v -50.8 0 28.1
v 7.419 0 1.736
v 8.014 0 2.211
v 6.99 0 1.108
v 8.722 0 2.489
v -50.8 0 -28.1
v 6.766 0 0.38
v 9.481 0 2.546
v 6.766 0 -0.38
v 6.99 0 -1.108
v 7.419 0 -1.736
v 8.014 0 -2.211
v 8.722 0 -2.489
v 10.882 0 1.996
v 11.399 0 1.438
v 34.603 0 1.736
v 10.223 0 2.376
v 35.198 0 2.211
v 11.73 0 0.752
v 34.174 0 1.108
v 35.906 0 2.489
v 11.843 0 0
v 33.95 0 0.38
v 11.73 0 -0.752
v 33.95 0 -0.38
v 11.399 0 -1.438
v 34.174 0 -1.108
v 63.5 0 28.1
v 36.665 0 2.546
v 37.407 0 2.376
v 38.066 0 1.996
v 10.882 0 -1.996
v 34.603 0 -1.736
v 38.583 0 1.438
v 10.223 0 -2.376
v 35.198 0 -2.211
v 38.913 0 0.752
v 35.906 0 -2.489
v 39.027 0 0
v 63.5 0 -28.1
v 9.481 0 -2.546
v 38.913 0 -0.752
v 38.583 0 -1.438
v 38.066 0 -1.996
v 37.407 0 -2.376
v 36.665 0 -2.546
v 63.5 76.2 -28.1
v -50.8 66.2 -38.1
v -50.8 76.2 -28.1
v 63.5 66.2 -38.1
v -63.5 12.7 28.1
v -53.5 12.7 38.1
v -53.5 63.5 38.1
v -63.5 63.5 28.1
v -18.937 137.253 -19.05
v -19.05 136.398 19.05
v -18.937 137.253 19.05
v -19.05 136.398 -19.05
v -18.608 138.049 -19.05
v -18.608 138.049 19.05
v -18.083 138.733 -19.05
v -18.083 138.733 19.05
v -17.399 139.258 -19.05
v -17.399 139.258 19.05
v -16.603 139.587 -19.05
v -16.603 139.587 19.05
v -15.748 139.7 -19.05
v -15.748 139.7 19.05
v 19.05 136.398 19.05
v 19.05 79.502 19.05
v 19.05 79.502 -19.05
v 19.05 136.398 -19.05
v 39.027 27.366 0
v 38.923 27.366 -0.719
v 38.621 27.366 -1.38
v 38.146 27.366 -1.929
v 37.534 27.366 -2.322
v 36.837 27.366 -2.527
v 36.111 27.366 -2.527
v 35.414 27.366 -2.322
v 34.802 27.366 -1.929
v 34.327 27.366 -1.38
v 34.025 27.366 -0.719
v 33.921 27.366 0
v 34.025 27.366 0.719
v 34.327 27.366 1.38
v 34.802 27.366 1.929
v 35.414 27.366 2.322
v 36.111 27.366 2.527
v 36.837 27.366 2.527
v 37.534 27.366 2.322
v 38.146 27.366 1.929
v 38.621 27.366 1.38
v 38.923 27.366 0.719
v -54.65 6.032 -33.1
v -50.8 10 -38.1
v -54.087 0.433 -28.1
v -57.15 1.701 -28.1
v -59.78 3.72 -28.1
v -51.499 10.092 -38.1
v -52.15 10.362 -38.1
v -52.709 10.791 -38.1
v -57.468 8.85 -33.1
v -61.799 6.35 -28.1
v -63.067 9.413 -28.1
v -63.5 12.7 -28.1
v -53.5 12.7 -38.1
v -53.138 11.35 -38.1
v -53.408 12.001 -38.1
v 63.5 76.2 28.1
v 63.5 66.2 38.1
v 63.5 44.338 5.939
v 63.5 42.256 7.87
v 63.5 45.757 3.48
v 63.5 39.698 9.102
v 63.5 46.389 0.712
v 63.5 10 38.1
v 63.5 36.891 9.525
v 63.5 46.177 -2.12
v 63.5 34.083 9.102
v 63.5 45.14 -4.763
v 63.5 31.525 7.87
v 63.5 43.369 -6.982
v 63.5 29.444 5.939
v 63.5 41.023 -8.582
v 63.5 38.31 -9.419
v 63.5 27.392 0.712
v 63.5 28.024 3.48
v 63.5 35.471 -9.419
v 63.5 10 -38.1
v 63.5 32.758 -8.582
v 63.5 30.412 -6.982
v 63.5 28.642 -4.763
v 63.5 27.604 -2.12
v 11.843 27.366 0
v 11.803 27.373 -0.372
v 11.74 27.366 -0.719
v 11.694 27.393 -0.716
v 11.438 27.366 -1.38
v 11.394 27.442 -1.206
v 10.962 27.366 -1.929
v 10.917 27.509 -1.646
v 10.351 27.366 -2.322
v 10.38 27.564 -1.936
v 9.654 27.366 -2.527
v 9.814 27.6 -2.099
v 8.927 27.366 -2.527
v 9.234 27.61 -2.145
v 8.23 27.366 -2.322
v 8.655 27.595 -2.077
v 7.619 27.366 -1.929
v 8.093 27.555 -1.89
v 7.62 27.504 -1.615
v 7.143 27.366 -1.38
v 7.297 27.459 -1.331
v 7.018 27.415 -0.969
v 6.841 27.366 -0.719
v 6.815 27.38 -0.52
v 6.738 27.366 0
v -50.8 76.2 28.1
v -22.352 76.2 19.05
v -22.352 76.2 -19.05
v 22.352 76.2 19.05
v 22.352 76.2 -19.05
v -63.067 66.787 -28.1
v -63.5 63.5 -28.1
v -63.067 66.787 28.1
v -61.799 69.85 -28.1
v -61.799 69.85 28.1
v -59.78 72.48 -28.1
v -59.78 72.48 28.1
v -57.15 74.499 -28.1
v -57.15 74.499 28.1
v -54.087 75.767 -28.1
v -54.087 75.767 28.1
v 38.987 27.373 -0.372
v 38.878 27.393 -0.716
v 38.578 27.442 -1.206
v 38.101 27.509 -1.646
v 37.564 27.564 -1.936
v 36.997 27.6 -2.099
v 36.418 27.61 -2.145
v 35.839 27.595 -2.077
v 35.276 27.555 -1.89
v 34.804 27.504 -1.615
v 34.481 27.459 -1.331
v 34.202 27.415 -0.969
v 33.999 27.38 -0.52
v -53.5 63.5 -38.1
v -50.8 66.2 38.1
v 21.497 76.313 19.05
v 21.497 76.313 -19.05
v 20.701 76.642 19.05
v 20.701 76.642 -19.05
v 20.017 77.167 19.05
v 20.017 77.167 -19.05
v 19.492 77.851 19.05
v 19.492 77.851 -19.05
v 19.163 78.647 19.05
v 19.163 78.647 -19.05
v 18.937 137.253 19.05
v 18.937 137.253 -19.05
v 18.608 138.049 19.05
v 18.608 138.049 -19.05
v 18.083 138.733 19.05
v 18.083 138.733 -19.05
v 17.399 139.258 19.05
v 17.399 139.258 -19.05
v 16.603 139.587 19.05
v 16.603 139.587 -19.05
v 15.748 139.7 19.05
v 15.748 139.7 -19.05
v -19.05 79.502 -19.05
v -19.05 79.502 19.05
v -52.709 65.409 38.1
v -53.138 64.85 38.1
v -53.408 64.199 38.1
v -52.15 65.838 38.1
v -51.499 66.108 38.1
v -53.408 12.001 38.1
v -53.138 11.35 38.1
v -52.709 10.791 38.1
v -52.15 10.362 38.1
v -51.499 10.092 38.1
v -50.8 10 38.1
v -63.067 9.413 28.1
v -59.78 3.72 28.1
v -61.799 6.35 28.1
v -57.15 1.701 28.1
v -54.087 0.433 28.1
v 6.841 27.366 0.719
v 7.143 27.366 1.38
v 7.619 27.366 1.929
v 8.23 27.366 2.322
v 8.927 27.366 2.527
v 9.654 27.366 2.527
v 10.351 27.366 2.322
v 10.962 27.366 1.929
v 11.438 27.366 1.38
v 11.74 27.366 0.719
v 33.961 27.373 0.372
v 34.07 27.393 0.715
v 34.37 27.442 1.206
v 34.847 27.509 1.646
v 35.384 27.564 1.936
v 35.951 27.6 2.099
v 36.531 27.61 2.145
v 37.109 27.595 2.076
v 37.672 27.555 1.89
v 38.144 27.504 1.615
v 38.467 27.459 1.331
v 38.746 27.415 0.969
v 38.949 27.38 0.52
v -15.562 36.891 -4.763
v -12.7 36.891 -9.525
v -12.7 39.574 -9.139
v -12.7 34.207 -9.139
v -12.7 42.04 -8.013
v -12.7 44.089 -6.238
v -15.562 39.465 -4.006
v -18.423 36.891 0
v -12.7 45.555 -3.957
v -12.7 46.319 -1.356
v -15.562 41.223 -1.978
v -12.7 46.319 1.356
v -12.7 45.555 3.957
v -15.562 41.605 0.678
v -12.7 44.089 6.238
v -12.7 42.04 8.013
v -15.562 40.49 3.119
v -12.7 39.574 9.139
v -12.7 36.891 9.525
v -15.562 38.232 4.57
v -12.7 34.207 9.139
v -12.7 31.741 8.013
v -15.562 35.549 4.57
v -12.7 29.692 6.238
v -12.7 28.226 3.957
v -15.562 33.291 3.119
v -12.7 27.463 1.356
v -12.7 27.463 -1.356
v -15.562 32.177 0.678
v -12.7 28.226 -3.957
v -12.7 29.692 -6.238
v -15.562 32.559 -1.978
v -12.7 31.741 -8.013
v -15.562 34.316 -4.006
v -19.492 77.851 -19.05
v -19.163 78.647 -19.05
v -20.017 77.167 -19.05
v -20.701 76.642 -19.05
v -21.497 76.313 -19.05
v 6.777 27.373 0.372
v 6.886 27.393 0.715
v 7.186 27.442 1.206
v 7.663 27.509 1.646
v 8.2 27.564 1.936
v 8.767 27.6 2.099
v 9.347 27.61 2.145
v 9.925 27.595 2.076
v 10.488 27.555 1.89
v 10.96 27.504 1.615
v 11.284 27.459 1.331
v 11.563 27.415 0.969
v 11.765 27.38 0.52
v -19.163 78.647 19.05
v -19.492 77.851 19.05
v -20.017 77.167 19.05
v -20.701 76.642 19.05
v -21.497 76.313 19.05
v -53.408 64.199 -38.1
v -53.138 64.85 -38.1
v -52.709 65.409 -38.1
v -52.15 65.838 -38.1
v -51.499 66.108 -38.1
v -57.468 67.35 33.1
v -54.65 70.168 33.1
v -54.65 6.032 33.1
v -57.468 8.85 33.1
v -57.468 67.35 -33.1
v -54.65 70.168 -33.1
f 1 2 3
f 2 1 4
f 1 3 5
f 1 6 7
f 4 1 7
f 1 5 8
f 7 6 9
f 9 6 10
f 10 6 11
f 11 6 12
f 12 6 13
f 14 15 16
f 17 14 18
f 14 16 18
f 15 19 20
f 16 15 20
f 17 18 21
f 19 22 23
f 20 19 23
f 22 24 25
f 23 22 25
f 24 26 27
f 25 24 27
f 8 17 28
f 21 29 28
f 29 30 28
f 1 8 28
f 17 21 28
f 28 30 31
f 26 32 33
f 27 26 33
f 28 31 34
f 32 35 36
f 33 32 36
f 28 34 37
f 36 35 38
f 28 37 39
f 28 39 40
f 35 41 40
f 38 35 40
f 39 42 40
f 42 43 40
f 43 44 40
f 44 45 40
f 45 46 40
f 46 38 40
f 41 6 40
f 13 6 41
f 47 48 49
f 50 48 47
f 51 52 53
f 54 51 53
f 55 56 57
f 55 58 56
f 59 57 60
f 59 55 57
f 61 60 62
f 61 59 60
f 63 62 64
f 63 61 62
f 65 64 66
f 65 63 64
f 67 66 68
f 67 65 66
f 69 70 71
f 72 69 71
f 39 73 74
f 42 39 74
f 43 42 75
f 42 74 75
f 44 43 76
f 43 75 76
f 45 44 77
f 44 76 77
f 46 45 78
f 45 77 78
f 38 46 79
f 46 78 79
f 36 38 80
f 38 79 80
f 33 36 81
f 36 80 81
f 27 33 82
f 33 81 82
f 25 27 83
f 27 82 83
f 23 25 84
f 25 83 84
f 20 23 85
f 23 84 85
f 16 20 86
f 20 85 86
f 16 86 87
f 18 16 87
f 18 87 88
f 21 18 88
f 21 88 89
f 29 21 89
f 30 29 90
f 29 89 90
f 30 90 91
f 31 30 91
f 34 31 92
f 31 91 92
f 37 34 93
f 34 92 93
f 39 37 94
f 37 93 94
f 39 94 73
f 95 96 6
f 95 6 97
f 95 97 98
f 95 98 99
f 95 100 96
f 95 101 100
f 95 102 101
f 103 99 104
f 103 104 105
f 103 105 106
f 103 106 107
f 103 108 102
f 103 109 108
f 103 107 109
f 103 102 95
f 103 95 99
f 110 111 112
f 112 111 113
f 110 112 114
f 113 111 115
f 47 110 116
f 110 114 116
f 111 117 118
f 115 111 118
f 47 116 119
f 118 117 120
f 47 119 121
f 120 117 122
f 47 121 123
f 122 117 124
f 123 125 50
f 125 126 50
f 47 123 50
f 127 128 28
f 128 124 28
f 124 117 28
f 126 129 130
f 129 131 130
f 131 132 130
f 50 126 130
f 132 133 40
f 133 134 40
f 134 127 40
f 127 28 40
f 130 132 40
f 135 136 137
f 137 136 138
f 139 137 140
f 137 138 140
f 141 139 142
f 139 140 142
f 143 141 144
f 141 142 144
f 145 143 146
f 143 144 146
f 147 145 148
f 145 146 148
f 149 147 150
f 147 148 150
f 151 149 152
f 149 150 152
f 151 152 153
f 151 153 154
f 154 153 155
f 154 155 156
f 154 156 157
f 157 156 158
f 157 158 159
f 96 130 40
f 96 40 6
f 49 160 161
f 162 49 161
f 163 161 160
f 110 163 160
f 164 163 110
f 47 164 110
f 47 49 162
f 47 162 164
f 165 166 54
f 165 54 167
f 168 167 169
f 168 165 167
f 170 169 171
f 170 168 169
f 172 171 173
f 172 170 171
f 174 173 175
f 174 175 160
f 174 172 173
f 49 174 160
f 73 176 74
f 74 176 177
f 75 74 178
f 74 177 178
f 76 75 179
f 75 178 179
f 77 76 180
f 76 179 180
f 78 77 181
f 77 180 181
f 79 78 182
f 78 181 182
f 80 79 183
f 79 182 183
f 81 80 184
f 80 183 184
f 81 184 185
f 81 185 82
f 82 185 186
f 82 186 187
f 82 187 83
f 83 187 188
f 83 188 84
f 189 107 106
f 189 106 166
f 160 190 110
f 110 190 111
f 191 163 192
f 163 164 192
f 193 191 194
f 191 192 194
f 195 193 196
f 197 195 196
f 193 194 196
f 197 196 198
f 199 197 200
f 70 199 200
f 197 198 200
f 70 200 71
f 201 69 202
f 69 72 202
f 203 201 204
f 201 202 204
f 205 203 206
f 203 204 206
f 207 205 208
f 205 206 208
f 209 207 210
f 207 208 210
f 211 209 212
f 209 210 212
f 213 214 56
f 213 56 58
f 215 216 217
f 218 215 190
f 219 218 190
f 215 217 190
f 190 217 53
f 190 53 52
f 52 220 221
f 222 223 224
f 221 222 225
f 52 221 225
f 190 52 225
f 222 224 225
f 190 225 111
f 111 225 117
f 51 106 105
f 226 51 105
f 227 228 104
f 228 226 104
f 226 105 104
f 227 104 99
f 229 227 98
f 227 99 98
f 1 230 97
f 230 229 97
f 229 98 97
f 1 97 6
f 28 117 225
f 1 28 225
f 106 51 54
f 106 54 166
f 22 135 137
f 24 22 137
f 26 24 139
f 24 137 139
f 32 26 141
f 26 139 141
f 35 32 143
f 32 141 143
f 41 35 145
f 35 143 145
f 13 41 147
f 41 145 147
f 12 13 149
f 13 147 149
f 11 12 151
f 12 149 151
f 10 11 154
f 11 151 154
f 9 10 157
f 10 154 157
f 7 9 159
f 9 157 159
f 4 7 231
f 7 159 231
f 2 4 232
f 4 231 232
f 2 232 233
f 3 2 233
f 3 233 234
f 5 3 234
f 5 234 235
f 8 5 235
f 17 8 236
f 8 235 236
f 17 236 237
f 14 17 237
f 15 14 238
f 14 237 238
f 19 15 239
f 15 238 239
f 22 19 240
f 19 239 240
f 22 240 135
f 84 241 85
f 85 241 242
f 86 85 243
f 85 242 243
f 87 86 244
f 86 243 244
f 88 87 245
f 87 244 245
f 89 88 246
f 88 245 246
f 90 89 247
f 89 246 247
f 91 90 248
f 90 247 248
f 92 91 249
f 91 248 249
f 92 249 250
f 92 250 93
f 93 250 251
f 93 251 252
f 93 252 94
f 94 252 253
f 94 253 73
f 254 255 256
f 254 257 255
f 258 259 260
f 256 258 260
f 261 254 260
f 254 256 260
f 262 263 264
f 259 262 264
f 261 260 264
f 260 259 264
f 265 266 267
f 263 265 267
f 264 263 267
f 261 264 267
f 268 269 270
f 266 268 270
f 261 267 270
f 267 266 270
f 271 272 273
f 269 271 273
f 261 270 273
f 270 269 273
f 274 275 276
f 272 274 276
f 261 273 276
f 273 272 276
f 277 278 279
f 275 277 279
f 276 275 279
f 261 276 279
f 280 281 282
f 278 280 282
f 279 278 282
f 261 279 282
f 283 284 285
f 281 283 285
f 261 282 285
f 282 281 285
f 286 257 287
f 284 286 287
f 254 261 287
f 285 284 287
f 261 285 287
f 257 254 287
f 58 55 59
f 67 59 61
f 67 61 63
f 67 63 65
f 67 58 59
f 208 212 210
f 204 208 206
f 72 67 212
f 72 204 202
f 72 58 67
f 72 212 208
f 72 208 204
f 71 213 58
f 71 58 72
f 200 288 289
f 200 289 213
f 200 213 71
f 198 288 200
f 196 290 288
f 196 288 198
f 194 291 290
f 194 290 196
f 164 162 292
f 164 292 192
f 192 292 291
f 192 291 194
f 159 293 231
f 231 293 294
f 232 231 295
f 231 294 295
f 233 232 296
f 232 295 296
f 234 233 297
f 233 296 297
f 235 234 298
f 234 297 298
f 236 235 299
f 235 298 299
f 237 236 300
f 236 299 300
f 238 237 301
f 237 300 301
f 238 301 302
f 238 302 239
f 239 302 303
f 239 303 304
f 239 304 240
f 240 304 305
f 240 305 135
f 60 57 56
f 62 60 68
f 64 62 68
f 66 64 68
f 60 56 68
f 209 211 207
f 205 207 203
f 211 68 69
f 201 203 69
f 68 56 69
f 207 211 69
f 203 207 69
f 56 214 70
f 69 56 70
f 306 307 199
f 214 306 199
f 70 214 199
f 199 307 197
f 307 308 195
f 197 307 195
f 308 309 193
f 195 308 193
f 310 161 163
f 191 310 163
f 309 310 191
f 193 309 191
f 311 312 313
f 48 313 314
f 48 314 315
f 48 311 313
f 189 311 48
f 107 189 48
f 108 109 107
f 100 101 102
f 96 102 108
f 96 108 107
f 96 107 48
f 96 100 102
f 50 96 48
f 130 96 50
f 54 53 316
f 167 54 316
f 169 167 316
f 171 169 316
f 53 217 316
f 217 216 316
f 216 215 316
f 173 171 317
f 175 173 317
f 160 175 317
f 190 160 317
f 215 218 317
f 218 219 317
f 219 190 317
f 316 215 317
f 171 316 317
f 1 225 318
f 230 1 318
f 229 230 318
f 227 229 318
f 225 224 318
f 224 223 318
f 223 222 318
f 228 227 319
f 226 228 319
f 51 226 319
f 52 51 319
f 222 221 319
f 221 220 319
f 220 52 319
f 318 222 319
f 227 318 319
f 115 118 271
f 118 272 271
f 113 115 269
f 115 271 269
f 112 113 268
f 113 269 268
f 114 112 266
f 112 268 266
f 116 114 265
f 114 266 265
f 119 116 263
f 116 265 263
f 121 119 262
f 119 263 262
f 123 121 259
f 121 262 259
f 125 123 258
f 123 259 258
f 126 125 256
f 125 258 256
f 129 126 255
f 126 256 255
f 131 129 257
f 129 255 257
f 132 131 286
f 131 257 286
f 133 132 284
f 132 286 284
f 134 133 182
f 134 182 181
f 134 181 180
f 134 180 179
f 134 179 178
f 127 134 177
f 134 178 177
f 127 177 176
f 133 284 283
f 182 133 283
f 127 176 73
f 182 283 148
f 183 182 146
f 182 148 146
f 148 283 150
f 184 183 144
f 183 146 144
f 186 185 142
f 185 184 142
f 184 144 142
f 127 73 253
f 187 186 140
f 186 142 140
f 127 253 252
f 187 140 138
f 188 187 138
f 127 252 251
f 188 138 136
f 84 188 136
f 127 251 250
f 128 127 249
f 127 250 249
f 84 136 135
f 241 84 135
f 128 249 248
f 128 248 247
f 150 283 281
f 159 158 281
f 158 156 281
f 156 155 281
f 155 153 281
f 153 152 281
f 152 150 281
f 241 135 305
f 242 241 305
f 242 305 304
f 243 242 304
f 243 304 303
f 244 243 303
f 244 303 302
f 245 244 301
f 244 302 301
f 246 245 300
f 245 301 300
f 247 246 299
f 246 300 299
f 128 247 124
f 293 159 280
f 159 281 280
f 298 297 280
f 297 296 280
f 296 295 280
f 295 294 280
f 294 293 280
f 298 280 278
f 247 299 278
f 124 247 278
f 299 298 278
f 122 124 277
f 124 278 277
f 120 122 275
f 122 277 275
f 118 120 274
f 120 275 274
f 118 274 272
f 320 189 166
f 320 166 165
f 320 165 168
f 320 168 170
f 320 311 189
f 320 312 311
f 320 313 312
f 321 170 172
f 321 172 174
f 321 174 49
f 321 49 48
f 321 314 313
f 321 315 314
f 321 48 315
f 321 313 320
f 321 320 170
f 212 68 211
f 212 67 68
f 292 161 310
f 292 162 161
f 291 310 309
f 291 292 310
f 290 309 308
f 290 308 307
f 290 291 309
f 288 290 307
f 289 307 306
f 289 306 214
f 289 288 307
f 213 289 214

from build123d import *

# Parameters (mm, degrees)
SKETCH2_W                      = 127
SKETCH2_H                      = 76.2
BOSS_EXTRUDE2_DEPTH            = 76.2
FILLET1_R                      = 12.7
CHAMFER1_SIZE                  = 10
F_3_4_0_7500_DOWEL_HOLE1_D     = 19.05
F_3_4_0_7500_DOWEL_HOLE1_DEPTH = 76.2
F_3_4_0_7500_DOWEL_HOLE1_TIP   = 5.723197396
SKETCH9_W                      = 38.1
SKETCH9_H                      = 38.1
BOSS_EXTRUDE3_DEPTH            = 63.5
FILLET2_R                      = 3.302


# Read off the part's stored shape, not the designer's step: 1/4-20 Tapped Hole1
with BuildPart() as part:
    # Sketch2 → Boss-Extrude2 (new body)
    with BuildSketch(Plane(origin=(0, 0, 0), x_dir=(1, 0, 0), z_dir=(0, 1, 0))):
        Rectangle(SKETCH2_W, SKETCH2_H)
    extrude(amount=BOSS_EXTRUDE2_DEPTH)

    # Fillet1
    fillet1_edges = [part.edges().sort_by_distance(p)[0] for p in [
        (-63.5, 76.2, 0),
        (-63.5, 0, 0),
    ]]
    fillet(fillet1_edges, radius=FILLET1_R)

    # Chamfer1
    chamfer1_edges = [part.edges().sort_by_distance(p)[0] for p in [
        (-63.5, 38.1, 38.1),
        (-63.5, 38.1, -38.1),
        (6.35, 0, 38.1),
        (6.35, 76.2, 38.1),
        (-59.780256121, 72.480256121, 38.1),
        (-59.780256121, 3.719743879, 38.1),
        (-59.780256121, 72.480256121, -38.1),
        (-59.780256121, 3.719743879, -38.1),
        (6.35, 0, -38.1),
        (6.35, 76.2, -38.1),
    ]]
    chamfer(chamfer1_edges, length=CHAMFER1_SIZE)

    # 3/4 (0.7500) Dowel Hole1
    with Locations(Plane(origin=(63.5, 0, 0), x_dir=(0, 0, -1), z_dir=(1, 0, 0))):
        with Locations((0, 36.890636669)):
            Hole(F_3_4_0_7500_DOWEL_HOLE1_D / 2, depth=F_3_4_0_7500_DOWEL_HOLE1_DEPTH)
            with Locations((0, 0, -(F_3_4_0_7500_DOWEL_HOLE1_DEPTH + F_3_4_0_7500_DOWEL_HOLE1_TIP / 2))):  # 118° drill point
                Cone(0, F_3_4_0_7500_DOWEL_HOLE1_D / 2, F_3_4_0_7500_DOWEL_HOLE1_TIP, mode=Mode.SUBTRACT)

    # 1/4-20 Tapped Hole1 outline → 1/4-20 Tapped Hole1 (revolve, cut)
    with BuildSketch(Plane(origin=(9.290251981, 0, 0), x_dir=(1, 0, 0), z_dir=(0, 0, 1))):
        Polygon((2.145213652, 27.610479168), (0, 27.610479168), (0, 0), (2.5527, 0), (2.5527, 27.365636669), align=None)
    revolve(axis=Axis((9.290251981, 0, 0), (0, 1, 0)), mode=Mode.SUBTRACT)

    # 1_4-20 Tapped Hole1 2 outline → 1_4-20 Tapped Hole1 2 (revolve, cut)
    with BuildSketch(Plane(origin=(36.474004082, 0, 0), x_dir=(1, 0, 0), z_dir=(0, 0, 1))):
        Polygon((2.5527, 0), (2.5527, 27.365636669), (2.145213678, 27.610479152), (0, 27.610479152), (0, 0), align=None)
    revolve(axis=Axis((36.474004082, 0, 0), (0, 1, 0)), mode=Mode.SUBTRACT)

    # Sketch9 → Boss-Extrude3 (add)
    with BuildSketch(Plane(origin=(0, 76.2, 0), x_dir=(1, 0, 0), z_dir=(0, 1, 0))):
        Rectangle(SKETCH9_W, SKETCH9_H)
    extrude(amount=BOSS_EXTRUDE3_DEPTH)

    # Fillet2
    fillet2_edges = [part.edges().sort_by_distance(p)[0] for p in [
        (19.05, 76.2, 0),
        (-19.05, 76.2, 0),
        (19.05, 139.7, 0),
        (-19.05, 139.7, 0),
    ]]
    fillet(fillet2_edges, radius=FILLET2_R)


solid = part.part
